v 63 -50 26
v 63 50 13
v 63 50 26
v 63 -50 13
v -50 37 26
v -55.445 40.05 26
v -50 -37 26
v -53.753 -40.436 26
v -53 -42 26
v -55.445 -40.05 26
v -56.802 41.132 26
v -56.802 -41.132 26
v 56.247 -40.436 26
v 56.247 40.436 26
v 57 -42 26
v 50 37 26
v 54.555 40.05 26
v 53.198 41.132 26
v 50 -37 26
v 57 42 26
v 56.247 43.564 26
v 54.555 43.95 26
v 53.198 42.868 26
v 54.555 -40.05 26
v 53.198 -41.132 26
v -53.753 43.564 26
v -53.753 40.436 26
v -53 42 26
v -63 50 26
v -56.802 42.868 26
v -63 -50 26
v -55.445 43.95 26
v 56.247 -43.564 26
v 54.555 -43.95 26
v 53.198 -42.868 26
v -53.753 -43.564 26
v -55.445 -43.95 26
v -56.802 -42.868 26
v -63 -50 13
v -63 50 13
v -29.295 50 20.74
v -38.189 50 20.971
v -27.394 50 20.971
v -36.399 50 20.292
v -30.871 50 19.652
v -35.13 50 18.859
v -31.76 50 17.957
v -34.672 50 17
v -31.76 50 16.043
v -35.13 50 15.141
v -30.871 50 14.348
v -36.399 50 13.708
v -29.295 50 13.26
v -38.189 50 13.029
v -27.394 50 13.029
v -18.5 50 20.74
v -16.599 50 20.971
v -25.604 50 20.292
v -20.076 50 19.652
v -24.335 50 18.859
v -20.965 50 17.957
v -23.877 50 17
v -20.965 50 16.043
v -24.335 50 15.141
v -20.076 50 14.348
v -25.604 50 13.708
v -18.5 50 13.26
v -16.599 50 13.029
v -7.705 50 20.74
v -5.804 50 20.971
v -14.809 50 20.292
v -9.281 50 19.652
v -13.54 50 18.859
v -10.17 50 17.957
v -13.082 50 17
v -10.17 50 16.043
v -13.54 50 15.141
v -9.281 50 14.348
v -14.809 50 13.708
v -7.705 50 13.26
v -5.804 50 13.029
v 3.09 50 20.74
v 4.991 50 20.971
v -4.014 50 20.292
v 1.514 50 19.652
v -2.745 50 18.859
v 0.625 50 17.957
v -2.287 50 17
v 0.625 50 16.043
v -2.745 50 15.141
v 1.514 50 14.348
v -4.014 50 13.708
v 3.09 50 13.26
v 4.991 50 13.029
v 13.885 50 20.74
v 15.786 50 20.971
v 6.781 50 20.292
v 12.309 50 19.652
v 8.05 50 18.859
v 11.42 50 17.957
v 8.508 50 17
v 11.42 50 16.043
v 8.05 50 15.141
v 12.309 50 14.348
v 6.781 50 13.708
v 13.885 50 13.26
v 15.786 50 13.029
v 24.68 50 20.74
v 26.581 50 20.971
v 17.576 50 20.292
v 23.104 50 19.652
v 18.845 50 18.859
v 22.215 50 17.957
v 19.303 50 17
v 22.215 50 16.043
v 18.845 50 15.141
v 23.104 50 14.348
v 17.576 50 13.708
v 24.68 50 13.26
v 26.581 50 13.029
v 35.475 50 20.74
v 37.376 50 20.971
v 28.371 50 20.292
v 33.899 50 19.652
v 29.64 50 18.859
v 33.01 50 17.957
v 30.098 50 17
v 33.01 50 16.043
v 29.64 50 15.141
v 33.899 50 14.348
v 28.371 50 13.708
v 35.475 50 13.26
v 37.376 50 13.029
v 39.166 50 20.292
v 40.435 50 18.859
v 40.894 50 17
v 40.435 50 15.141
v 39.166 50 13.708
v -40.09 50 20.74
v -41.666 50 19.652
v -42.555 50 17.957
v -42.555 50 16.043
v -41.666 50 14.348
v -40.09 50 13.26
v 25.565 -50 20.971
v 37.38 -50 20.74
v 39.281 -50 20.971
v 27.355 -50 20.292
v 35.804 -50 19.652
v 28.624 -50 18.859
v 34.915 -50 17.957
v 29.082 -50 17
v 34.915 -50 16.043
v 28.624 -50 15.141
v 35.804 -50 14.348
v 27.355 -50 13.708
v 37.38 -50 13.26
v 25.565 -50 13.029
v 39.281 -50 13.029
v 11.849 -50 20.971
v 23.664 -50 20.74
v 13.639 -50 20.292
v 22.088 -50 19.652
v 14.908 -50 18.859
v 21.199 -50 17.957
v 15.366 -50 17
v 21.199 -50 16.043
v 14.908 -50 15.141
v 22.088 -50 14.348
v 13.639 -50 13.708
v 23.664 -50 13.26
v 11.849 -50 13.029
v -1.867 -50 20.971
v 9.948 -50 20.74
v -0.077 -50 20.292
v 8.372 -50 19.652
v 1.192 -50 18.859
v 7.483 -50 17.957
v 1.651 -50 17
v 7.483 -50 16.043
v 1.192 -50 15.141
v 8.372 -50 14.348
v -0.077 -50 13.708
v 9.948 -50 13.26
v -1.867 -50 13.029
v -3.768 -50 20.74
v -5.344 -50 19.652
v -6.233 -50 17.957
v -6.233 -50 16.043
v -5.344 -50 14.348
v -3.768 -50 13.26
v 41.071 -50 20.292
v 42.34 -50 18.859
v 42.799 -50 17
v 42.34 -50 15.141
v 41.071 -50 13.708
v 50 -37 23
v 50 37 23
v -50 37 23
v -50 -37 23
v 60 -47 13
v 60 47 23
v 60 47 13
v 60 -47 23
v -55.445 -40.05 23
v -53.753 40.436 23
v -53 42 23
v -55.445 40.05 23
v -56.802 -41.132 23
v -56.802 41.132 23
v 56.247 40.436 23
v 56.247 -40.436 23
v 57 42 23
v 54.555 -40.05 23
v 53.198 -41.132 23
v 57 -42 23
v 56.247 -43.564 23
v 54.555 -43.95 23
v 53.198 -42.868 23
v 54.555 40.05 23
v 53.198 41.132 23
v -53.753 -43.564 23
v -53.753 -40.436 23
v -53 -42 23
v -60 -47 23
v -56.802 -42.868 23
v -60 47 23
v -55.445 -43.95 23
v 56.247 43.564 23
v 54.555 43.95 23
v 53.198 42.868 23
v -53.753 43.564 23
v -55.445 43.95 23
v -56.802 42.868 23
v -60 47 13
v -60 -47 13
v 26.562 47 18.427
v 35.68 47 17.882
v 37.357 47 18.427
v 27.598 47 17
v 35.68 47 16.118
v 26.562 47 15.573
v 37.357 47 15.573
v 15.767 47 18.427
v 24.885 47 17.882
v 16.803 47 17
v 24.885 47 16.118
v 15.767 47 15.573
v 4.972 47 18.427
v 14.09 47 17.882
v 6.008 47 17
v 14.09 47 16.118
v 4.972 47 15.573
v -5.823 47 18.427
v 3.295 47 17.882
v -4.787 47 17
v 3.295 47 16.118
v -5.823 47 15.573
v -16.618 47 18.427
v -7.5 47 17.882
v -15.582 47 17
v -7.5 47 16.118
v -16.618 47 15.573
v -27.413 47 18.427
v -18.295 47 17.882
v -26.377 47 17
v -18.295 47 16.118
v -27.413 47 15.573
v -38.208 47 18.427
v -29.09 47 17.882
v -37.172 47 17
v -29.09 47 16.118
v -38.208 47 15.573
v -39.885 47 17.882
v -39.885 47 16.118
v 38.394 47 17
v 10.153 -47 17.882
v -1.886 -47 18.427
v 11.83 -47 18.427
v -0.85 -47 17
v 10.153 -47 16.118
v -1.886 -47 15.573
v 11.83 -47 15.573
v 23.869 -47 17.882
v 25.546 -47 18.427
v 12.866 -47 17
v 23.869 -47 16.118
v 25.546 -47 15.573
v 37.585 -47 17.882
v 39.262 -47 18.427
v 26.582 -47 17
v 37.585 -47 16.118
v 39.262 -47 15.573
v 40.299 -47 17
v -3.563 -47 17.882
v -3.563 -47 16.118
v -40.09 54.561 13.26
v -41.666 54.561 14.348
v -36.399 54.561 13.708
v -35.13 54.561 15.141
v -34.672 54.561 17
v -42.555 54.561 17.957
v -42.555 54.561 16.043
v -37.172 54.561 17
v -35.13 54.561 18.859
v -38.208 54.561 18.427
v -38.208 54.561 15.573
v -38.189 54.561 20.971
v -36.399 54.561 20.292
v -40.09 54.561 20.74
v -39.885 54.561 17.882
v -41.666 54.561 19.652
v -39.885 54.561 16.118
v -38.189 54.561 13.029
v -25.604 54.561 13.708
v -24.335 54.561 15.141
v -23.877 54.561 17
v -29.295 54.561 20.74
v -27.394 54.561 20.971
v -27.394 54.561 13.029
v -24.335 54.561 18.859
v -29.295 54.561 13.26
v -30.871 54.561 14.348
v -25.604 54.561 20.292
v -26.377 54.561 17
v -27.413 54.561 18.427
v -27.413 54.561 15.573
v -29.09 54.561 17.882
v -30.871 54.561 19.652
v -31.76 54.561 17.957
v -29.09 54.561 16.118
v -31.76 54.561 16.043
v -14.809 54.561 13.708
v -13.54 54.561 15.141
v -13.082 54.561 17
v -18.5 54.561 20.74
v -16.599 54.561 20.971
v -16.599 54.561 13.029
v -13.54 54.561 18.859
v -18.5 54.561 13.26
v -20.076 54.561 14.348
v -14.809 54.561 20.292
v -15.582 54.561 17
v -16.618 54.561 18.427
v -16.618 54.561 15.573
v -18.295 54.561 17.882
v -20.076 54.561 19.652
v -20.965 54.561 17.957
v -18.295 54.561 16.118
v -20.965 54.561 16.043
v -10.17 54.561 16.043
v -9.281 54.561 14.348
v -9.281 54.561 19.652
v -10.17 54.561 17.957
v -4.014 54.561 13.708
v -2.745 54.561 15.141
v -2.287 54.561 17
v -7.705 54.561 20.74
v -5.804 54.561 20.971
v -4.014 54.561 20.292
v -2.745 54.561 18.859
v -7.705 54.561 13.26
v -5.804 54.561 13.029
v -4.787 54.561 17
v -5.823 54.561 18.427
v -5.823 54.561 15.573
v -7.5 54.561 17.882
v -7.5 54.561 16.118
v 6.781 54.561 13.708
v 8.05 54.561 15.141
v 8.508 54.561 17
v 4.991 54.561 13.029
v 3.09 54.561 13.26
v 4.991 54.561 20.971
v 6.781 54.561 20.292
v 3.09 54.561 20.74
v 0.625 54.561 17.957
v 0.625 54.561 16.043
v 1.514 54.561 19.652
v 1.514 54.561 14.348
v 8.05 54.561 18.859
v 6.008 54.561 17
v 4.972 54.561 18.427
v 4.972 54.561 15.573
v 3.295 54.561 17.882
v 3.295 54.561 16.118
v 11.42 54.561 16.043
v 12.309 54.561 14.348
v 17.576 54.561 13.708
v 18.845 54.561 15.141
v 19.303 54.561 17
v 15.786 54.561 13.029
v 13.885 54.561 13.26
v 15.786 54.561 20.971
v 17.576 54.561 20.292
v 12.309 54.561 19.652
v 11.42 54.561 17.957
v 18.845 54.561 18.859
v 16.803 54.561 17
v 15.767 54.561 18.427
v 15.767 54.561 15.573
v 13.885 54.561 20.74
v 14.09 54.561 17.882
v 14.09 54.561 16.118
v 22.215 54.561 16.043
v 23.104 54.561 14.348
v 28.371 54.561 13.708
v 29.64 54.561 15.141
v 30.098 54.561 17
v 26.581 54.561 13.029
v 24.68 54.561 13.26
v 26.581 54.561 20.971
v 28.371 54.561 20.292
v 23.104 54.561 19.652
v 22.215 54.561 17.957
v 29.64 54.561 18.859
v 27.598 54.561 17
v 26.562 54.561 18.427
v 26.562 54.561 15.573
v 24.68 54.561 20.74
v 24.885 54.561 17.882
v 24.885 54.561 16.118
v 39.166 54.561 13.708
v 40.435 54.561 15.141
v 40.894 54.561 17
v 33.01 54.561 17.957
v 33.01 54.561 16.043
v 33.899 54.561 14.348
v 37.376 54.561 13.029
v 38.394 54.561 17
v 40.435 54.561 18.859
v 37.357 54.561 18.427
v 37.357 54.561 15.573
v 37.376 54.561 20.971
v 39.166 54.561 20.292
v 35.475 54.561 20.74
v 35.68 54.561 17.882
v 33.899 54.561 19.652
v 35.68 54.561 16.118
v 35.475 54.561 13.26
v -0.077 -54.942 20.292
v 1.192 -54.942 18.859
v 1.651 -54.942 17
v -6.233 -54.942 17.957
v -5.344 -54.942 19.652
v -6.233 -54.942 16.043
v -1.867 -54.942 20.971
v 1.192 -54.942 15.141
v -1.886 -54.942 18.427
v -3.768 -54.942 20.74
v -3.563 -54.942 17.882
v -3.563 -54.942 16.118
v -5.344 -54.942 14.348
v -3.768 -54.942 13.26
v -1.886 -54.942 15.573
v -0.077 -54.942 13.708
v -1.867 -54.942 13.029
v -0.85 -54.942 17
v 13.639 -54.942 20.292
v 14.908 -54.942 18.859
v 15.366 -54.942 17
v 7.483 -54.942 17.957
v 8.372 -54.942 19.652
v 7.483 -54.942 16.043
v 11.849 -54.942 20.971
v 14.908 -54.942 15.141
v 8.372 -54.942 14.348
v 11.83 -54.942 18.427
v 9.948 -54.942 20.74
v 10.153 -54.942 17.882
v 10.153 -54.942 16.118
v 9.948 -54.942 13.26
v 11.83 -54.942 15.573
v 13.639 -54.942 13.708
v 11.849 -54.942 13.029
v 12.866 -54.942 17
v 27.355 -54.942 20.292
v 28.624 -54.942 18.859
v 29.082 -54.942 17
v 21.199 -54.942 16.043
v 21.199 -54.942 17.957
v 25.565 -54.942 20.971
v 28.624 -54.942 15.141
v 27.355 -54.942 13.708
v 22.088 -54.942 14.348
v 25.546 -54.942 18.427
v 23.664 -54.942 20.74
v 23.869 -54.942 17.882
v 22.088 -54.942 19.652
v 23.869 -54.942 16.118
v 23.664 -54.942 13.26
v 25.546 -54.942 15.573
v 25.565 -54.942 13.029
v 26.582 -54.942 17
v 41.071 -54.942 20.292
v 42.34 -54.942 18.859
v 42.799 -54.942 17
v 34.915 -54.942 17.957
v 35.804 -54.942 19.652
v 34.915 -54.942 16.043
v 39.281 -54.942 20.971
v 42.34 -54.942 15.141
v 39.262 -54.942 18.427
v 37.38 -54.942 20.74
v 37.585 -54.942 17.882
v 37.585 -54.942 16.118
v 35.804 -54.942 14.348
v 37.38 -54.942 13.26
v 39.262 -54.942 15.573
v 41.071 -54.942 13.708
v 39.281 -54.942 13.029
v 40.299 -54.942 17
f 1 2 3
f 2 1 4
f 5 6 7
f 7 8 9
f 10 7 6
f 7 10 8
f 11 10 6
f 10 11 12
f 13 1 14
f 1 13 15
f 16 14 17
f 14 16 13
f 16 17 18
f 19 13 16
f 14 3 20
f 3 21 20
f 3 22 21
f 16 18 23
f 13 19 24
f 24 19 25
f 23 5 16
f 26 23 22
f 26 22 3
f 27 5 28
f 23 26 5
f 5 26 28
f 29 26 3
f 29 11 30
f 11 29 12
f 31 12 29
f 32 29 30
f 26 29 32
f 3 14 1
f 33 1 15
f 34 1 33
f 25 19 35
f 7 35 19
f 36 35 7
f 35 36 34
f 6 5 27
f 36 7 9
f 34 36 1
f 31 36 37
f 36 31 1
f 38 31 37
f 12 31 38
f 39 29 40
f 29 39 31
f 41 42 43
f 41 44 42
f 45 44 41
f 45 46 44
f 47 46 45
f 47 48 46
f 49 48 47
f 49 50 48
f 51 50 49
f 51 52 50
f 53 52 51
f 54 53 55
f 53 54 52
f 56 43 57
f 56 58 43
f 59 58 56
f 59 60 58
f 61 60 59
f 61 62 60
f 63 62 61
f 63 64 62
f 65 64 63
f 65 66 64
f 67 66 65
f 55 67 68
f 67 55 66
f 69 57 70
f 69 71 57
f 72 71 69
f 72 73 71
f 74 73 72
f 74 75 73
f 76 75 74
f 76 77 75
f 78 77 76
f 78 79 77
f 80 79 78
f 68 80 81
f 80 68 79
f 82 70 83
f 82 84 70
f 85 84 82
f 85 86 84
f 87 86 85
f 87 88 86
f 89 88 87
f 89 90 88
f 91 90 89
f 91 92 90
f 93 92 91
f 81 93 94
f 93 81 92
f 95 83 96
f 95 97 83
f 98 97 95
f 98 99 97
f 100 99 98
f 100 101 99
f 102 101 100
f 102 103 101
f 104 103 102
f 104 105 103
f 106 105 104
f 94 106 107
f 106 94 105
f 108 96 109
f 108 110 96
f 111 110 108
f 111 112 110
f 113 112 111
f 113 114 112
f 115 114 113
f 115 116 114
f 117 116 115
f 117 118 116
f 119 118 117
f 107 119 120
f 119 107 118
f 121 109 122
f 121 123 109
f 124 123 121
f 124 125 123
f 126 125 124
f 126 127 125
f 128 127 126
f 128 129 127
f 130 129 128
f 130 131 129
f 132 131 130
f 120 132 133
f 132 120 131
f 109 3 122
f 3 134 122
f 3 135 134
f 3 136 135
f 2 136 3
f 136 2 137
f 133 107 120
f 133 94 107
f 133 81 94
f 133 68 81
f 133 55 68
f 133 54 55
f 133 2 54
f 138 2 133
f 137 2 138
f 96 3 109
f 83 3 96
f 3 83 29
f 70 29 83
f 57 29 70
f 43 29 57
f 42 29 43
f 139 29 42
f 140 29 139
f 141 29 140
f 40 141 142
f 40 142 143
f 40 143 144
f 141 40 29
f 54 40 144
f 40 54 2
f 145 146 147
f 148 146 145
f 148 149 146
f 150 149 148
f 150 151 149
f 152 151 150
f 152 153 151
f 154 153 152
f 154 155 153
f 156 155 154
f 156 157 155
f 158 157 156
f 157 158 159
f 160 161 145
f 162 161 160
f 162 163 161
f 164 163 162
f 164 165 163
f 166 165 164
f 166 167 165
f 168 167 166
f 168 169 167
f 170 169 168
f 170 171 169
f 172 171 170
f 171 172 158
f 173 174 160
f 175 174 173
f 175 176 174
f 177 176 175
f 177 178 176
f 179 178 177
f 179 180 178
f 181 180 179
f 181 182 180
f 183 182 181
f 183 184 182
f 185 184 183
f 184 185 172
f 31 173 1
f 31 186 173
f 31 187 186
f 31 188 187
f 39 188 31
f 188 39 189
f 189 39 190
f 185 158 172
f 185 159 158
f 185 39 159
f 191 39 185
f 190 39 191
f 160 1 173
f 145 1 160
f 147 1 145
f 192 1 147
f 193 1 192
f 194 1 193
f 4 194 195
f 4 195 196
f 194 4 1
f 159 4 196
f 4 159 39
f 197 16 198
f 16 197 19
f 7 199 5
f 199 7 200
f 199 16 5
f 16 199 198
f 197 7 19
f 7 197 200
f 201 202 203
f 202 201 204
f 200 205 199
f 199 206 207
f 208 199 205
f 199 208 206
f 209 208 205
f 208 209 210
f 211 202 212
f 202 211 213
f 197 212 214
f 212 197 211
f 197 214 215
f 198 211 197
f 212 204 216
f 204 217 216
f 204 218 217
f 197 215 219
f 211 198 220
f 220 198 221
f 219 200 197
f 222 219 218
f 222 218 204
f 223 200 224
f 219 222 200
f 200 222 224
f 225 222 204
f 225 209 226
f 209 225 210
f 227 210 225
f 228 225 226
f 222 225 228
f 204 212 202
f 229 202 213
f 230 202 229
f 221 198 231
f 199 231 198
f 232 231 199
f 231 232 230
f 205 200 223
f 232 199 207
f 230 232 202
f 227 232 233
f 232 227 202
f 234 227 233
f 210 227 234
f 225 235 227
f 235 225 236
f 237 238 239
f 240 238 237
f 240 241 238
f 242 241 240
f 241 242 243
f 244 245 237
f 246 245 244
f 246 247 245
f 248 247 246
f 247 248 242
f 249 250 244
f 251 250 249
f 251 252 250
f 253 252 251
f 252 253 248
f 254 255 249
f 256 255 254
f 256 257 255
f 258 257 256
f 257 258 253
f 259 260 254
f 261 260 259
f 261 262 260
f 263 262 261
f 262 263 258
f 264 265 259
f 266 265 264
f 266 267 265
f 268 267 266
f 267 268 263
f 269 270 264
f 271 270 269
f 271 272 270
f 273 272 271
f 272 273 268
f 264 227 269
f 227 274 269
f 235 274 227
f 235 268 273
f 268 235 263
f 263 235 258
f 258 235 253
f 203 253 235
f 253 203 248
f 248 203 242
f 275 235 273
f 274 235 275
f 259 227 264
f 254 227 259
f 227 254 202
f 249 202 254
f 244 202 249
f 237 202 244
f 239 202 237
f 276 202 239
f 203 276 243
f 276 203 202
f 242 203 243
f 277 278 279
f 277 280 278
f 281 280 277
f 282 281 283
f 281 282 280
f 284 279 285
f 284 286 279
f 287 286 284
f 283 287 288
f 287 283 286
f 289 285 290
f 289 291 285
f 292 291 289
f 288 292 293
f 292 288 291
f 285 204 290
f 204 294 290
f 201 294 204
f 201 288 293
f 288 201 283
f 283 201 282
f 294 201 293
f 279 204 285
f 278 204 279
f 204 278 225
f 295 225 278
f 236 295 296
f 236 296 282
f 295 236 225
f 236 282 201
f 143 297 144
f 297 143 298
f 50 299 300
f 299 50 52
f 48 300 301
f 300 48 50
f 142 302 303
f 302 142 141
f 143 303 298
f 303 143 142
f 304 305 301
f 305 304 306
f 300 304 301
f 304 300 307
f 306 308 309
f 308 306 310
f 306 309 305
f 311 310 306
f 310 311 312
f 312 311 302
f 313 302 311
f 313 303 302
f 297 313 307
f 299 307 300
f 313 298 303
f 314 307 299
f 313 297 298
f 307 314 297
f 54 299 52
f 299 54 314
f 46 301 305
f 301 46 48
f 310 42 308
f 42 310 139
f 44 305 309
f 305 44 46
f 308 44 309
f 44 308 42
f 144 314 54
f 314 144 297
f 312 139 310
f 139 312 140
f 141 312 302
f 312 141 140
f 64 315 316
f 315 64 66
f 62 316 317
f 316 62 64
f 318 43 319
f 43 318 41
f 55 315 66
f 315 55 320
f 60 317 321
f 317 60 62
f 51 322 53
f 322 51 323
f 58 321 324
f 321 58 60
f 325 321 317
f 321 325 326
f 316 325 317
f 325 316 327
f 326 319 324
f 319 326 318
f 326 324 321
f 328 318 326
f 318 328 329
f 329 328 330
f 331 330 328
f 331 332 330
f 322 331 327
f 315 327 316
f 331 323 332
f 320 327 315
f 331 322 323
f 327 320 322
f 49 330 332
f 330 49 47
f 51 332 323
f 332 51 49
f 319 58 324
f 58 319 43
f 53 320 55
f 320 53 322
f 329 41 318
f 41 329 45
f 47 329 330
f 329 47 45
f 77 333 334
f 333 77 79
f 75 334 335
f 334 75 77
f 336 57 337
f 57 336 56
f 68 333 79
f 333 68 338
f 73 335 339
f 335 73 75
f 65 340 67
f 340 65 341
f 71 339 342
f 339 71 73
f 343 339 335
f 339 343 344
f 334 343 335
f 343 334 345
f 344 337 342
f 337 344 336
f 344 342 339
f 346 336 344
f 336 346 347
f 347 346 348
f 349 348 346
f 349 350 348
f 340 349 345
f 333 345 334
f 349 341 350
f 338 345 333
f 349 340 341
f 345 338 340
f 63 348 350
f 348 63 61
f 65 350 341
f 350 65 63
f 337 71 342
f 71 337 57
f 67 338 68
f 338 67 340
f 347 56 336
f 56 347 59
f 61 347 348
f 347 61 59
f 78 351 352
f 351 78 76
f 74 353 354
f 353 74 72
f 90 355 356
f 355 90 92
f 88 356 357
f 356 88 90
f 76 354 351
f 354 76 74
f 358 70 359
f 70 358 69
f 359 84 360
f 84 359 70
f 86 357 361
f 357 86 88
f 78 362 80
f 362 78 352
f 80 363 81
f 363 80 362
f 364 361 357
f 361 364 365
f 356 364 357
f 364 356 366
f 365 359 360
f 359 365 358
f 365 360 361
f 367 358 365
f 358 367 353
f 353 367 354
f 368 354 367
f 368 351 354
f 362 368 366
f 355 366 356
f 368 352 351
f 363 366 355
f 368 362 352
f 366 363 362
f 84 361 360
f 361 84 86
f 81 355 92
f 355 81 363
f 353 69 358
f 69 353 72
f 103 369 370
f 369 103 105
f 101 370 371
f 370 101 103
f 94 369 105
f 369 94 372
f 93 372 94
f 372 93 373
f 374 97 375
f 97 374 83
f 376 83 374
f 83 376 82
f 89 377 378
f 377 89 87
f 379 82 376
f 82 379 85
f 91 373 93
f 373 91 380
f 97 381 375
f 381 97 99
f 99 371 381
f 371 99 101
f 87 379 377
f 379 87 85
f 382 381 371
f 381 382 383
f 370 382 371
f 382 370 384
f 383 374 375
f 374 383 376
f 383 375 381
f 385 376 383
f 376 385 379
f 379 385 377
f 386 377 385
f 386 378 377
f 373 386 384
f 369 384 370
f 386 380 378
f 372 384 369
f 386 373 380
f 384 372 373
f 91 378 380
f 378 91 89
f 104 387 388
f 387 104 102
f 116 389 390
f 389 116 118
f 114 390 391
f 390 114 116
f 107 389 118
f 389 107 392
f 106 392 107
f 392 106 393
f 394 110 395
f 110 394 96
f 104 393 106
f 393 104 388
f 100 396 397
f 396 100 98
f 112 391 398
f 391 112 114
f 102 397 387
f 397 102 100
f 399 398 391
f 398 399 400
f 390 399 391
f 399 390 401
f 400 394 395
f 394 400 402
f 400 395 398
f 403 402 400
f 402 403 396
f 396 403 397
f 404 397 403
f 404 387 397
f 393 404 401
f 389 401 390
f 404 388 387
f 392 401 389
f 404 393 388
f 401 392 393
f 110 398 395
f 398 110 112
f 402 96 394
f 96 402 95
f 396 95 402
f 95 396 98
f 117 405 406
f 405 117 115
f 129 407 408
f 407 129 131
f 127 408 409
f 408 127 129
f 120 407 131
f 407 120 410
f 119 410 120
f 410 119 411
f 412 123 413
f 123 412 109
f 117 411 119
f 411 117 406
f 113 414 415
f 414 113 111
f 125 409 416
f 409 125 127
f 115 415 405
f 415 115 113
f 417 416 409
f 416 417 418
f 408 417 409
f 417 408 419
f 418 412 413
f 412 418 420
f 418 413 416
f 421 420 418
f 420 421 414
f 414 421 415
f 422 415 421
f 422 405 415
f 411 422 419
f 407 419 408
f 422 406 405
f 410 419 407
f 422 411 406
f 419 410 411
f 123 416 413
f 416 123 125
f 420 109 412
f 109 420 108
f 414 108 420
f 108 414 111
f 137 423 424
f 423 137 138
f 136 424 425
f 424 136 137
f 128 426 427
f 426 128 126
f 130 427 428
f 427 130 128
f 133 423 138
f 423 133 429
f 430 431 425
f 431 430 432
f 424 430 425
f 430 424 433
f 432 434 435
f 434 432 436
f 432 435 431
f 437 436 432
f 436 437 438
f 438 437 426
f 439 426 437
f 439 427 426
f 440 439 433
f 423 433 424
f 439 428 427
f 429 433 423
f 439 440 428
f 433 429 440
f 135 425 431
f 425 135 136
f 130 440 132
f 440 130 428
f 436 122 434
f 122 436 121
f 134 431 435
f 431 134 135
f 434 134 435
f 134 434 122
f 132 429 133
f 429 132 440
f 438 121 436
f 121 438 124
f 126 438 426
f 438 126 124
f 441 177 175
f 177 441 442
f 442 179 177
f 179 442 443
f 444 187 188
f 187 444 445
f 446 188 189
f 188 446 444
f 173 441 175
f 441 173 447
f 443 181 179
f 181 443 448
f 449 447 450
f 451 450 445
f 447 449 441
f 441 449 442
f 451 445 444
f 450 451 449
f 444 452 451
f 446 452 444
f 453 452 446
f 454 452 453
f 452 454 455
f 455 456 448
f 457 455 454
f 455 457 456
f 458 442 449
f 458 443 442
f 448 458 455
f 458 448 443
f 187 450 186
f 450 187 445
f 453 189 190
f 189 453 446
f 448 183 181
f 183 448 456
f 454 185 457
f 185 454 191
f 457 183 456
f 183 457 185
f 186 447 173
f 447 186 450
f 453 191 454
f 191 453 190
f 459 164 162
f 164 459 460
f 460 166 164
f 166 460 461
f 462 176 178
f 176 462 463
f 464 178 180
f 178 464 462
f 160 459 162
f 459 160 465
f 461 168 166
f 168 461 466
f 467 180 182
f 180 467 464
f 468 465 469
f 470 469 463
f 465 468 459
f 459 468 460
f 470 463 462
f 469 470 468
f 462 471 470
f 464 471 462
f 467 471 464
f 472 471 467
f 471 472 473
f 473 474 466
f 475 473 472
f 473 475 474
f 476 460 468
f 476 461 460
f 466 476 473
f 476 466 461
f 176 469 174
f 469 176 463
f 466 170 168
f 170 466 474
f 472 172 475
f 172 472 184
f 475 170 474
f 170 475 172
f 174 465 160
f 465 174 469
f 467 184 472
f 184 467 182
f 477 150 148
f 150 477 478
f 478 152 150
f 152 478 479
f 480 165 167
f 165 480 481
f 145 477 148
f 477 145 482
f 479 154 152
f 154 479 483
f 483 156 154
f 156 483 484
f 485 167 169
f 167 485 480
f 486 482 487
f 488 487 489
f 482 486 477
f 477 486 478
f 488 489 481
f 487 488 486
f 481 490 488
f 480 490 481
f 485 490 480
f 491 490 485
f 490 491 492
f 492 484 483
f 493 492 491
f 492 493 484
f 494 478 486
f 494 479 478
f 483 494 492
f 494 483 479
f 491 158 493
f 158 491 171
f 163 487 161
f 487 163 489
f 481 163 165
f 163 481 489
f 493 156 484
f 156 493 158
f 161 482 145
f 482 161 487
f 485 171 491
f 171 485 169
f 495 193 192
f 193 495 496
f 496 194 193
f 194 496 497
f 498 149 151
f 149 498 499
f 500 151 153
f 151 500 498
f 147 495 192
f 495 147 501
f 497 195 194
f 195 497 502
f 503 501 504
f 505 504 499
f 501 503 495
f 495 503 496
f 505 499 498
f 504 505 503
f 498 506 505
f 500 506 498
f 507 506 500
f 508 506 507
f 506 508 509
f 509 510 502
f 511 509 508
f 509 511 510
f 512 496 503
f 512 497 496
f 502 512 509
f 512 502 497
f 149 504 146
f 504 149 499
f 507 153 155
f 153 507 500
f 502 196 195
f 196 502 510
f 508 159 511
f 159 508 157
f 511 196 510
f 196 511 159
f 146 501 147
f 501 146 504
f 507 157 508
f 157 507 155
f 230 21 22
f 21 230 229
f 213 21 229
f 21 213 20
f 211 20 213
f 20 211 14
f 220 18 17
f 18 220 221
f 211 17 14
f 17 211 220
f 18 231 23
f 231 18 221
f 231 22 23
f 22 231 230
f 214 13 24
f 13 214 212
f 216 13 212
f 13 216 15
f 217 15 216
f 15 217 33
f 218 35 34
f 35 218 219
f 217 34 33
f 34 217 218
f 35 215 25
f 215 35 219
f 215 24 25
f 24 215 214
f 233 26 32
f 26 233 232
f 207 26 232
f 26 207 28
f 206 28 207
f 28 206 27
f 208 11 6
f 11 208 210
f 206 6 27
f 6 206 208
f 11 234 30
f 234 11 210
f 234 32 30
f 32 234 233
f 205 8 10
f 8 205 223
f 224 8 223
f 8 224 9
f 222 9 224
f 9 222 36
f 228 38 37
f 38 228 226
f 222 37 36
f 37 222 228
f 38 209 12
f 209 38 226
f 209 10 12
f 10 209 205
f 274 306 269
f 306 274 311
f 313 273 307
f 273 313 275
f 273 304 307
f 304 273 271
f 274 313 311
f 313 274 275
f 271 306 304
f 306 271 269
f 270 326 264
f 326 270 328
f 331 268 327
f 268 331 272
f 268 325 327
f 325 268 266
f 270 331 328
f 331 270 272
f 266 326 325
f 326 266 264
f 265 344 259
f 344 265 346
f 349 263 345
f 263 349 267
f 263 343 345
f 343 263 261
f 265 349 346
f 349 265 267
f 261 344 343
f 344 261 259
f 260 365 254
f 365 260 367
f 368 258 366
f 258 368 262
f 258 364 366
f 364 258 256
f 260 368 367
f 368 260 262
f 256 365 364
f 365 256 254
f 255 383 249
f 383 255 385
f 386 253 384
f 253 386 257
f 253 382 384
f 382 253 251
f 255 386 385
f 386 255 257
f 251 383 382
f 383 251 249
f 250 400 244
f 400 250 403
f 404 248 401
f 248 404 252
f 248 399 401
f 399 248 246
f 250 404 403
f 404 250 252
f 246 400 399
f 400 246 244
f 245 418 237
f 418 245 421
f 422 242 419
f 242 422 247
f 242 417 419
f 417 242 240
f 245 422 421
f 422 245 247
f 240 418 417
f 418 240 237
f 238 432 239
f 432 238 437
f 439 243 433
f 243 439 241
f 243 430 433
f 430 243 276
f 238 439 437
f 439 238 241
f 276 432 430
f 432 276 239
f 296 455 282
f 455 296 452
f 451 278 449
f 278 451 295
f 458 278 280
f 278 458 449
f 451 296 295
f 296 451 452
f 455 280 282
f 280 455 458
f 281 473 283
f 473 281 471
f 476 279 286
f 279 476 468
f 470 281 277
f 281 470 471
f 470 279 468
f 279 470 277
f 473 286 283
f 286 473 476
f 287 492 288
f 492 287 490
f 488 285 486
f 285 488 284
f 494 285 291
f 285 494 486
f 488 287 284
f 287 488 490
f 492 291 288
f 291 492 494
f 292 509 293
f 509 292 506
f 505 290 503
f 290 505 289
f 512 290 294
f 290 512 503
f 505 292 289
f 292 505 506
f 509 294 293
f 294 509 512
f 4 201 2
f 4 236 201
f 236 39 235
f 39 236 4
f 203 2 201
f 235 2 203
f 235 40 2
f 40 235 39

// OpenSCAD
//Distance from top of bottom encolosure to top of PCB 23mm

module cCube(v){
    d=-[v[0], v[1],0]/2;
    translate(d) cube(v);
}

module quadPlace(x,y){
    translate([x,y,0]) children();
    translate([x,-y,0]) children();
    translate([-x,y,0]) children();
    translate([-x,-y,0]) children();
}

module placeAlignmentScrews(){
    rotate([0,0,180])children();
    translate([0,70.739, 0]) children();
}

module placeDriverScrews(){
    translate([2.54+6.858,70.739+4.191,  0]) for(i=[0:7]) translate([i*10.795,0,0])children();
}

module placeRegulatorScrews(){
    translate([ 45.72,-4.572, 0 ]) for(i=[0:3]) translate([i*13.716,0,0])children();
}

module centerInBox(){
    translate([-96.139/2,-70.739/2, 0]) children();
}


module placeTo220Screws(){
    centerInBox() translate([0, 0, 17]){
        placeDriverScrews() rotate([-90,0,0]) children();
        placeRegulatorScrews() rotate([90,0,0]) children();
    }
}

module frame(){
    translate([0,0,17-4])
    difference(){
        cCube([115,89, 8]+[10,10,0]);
        cCube([115,89, 8]);
    }
}


module placePcbScrews(){
    centerInBox() placeAlignmentScrews()  children();
    mirror([1,0,0])centerInBox() placeAlignmentScrews() children();
}

module frameBody(){
    frame();
    intersection(){
        placePcbScrews() hull() {
            cylinder(21, 4, 4);
            translate([0, 20, 0])cylinder(21, 4, 4);
        }
        cCube([115,89, 21]+[10,10,0]);
    }
    placeTo220Screws() cylinder(15,4,4);
}

module pcbYig(){
    difference(){
        frameBody();
        placePcbScrews() cylinder(21,1.5,1.5);
        placeTo220Screws() cylinder(20,1.5,1.5);
        cCube([86,89, 30]);
    }
}

module boxYigBody(){
    difference(){
        cCube([120+6, 94+6,23+3]);
        cCube([120, 94,23+3]-[20, 20,-10]);
        cCube([120, 94,23]);
        
        
    }
    difference(){
        placeTo220Screws() cylinder(15,4,4);
        cCube([120, 94,23]);
        
    }
}

module boxYig(){
    difference(){
        boxYigBody();
        quadPlace(110/2,84/2) cylinder(30, 2, 2);
        placeTo220Screws() cylinder(15,1.5,1.5);
    }
}

difference(){
boxYig();
    cCube([200,200,13]);
}
//pcbYig();
